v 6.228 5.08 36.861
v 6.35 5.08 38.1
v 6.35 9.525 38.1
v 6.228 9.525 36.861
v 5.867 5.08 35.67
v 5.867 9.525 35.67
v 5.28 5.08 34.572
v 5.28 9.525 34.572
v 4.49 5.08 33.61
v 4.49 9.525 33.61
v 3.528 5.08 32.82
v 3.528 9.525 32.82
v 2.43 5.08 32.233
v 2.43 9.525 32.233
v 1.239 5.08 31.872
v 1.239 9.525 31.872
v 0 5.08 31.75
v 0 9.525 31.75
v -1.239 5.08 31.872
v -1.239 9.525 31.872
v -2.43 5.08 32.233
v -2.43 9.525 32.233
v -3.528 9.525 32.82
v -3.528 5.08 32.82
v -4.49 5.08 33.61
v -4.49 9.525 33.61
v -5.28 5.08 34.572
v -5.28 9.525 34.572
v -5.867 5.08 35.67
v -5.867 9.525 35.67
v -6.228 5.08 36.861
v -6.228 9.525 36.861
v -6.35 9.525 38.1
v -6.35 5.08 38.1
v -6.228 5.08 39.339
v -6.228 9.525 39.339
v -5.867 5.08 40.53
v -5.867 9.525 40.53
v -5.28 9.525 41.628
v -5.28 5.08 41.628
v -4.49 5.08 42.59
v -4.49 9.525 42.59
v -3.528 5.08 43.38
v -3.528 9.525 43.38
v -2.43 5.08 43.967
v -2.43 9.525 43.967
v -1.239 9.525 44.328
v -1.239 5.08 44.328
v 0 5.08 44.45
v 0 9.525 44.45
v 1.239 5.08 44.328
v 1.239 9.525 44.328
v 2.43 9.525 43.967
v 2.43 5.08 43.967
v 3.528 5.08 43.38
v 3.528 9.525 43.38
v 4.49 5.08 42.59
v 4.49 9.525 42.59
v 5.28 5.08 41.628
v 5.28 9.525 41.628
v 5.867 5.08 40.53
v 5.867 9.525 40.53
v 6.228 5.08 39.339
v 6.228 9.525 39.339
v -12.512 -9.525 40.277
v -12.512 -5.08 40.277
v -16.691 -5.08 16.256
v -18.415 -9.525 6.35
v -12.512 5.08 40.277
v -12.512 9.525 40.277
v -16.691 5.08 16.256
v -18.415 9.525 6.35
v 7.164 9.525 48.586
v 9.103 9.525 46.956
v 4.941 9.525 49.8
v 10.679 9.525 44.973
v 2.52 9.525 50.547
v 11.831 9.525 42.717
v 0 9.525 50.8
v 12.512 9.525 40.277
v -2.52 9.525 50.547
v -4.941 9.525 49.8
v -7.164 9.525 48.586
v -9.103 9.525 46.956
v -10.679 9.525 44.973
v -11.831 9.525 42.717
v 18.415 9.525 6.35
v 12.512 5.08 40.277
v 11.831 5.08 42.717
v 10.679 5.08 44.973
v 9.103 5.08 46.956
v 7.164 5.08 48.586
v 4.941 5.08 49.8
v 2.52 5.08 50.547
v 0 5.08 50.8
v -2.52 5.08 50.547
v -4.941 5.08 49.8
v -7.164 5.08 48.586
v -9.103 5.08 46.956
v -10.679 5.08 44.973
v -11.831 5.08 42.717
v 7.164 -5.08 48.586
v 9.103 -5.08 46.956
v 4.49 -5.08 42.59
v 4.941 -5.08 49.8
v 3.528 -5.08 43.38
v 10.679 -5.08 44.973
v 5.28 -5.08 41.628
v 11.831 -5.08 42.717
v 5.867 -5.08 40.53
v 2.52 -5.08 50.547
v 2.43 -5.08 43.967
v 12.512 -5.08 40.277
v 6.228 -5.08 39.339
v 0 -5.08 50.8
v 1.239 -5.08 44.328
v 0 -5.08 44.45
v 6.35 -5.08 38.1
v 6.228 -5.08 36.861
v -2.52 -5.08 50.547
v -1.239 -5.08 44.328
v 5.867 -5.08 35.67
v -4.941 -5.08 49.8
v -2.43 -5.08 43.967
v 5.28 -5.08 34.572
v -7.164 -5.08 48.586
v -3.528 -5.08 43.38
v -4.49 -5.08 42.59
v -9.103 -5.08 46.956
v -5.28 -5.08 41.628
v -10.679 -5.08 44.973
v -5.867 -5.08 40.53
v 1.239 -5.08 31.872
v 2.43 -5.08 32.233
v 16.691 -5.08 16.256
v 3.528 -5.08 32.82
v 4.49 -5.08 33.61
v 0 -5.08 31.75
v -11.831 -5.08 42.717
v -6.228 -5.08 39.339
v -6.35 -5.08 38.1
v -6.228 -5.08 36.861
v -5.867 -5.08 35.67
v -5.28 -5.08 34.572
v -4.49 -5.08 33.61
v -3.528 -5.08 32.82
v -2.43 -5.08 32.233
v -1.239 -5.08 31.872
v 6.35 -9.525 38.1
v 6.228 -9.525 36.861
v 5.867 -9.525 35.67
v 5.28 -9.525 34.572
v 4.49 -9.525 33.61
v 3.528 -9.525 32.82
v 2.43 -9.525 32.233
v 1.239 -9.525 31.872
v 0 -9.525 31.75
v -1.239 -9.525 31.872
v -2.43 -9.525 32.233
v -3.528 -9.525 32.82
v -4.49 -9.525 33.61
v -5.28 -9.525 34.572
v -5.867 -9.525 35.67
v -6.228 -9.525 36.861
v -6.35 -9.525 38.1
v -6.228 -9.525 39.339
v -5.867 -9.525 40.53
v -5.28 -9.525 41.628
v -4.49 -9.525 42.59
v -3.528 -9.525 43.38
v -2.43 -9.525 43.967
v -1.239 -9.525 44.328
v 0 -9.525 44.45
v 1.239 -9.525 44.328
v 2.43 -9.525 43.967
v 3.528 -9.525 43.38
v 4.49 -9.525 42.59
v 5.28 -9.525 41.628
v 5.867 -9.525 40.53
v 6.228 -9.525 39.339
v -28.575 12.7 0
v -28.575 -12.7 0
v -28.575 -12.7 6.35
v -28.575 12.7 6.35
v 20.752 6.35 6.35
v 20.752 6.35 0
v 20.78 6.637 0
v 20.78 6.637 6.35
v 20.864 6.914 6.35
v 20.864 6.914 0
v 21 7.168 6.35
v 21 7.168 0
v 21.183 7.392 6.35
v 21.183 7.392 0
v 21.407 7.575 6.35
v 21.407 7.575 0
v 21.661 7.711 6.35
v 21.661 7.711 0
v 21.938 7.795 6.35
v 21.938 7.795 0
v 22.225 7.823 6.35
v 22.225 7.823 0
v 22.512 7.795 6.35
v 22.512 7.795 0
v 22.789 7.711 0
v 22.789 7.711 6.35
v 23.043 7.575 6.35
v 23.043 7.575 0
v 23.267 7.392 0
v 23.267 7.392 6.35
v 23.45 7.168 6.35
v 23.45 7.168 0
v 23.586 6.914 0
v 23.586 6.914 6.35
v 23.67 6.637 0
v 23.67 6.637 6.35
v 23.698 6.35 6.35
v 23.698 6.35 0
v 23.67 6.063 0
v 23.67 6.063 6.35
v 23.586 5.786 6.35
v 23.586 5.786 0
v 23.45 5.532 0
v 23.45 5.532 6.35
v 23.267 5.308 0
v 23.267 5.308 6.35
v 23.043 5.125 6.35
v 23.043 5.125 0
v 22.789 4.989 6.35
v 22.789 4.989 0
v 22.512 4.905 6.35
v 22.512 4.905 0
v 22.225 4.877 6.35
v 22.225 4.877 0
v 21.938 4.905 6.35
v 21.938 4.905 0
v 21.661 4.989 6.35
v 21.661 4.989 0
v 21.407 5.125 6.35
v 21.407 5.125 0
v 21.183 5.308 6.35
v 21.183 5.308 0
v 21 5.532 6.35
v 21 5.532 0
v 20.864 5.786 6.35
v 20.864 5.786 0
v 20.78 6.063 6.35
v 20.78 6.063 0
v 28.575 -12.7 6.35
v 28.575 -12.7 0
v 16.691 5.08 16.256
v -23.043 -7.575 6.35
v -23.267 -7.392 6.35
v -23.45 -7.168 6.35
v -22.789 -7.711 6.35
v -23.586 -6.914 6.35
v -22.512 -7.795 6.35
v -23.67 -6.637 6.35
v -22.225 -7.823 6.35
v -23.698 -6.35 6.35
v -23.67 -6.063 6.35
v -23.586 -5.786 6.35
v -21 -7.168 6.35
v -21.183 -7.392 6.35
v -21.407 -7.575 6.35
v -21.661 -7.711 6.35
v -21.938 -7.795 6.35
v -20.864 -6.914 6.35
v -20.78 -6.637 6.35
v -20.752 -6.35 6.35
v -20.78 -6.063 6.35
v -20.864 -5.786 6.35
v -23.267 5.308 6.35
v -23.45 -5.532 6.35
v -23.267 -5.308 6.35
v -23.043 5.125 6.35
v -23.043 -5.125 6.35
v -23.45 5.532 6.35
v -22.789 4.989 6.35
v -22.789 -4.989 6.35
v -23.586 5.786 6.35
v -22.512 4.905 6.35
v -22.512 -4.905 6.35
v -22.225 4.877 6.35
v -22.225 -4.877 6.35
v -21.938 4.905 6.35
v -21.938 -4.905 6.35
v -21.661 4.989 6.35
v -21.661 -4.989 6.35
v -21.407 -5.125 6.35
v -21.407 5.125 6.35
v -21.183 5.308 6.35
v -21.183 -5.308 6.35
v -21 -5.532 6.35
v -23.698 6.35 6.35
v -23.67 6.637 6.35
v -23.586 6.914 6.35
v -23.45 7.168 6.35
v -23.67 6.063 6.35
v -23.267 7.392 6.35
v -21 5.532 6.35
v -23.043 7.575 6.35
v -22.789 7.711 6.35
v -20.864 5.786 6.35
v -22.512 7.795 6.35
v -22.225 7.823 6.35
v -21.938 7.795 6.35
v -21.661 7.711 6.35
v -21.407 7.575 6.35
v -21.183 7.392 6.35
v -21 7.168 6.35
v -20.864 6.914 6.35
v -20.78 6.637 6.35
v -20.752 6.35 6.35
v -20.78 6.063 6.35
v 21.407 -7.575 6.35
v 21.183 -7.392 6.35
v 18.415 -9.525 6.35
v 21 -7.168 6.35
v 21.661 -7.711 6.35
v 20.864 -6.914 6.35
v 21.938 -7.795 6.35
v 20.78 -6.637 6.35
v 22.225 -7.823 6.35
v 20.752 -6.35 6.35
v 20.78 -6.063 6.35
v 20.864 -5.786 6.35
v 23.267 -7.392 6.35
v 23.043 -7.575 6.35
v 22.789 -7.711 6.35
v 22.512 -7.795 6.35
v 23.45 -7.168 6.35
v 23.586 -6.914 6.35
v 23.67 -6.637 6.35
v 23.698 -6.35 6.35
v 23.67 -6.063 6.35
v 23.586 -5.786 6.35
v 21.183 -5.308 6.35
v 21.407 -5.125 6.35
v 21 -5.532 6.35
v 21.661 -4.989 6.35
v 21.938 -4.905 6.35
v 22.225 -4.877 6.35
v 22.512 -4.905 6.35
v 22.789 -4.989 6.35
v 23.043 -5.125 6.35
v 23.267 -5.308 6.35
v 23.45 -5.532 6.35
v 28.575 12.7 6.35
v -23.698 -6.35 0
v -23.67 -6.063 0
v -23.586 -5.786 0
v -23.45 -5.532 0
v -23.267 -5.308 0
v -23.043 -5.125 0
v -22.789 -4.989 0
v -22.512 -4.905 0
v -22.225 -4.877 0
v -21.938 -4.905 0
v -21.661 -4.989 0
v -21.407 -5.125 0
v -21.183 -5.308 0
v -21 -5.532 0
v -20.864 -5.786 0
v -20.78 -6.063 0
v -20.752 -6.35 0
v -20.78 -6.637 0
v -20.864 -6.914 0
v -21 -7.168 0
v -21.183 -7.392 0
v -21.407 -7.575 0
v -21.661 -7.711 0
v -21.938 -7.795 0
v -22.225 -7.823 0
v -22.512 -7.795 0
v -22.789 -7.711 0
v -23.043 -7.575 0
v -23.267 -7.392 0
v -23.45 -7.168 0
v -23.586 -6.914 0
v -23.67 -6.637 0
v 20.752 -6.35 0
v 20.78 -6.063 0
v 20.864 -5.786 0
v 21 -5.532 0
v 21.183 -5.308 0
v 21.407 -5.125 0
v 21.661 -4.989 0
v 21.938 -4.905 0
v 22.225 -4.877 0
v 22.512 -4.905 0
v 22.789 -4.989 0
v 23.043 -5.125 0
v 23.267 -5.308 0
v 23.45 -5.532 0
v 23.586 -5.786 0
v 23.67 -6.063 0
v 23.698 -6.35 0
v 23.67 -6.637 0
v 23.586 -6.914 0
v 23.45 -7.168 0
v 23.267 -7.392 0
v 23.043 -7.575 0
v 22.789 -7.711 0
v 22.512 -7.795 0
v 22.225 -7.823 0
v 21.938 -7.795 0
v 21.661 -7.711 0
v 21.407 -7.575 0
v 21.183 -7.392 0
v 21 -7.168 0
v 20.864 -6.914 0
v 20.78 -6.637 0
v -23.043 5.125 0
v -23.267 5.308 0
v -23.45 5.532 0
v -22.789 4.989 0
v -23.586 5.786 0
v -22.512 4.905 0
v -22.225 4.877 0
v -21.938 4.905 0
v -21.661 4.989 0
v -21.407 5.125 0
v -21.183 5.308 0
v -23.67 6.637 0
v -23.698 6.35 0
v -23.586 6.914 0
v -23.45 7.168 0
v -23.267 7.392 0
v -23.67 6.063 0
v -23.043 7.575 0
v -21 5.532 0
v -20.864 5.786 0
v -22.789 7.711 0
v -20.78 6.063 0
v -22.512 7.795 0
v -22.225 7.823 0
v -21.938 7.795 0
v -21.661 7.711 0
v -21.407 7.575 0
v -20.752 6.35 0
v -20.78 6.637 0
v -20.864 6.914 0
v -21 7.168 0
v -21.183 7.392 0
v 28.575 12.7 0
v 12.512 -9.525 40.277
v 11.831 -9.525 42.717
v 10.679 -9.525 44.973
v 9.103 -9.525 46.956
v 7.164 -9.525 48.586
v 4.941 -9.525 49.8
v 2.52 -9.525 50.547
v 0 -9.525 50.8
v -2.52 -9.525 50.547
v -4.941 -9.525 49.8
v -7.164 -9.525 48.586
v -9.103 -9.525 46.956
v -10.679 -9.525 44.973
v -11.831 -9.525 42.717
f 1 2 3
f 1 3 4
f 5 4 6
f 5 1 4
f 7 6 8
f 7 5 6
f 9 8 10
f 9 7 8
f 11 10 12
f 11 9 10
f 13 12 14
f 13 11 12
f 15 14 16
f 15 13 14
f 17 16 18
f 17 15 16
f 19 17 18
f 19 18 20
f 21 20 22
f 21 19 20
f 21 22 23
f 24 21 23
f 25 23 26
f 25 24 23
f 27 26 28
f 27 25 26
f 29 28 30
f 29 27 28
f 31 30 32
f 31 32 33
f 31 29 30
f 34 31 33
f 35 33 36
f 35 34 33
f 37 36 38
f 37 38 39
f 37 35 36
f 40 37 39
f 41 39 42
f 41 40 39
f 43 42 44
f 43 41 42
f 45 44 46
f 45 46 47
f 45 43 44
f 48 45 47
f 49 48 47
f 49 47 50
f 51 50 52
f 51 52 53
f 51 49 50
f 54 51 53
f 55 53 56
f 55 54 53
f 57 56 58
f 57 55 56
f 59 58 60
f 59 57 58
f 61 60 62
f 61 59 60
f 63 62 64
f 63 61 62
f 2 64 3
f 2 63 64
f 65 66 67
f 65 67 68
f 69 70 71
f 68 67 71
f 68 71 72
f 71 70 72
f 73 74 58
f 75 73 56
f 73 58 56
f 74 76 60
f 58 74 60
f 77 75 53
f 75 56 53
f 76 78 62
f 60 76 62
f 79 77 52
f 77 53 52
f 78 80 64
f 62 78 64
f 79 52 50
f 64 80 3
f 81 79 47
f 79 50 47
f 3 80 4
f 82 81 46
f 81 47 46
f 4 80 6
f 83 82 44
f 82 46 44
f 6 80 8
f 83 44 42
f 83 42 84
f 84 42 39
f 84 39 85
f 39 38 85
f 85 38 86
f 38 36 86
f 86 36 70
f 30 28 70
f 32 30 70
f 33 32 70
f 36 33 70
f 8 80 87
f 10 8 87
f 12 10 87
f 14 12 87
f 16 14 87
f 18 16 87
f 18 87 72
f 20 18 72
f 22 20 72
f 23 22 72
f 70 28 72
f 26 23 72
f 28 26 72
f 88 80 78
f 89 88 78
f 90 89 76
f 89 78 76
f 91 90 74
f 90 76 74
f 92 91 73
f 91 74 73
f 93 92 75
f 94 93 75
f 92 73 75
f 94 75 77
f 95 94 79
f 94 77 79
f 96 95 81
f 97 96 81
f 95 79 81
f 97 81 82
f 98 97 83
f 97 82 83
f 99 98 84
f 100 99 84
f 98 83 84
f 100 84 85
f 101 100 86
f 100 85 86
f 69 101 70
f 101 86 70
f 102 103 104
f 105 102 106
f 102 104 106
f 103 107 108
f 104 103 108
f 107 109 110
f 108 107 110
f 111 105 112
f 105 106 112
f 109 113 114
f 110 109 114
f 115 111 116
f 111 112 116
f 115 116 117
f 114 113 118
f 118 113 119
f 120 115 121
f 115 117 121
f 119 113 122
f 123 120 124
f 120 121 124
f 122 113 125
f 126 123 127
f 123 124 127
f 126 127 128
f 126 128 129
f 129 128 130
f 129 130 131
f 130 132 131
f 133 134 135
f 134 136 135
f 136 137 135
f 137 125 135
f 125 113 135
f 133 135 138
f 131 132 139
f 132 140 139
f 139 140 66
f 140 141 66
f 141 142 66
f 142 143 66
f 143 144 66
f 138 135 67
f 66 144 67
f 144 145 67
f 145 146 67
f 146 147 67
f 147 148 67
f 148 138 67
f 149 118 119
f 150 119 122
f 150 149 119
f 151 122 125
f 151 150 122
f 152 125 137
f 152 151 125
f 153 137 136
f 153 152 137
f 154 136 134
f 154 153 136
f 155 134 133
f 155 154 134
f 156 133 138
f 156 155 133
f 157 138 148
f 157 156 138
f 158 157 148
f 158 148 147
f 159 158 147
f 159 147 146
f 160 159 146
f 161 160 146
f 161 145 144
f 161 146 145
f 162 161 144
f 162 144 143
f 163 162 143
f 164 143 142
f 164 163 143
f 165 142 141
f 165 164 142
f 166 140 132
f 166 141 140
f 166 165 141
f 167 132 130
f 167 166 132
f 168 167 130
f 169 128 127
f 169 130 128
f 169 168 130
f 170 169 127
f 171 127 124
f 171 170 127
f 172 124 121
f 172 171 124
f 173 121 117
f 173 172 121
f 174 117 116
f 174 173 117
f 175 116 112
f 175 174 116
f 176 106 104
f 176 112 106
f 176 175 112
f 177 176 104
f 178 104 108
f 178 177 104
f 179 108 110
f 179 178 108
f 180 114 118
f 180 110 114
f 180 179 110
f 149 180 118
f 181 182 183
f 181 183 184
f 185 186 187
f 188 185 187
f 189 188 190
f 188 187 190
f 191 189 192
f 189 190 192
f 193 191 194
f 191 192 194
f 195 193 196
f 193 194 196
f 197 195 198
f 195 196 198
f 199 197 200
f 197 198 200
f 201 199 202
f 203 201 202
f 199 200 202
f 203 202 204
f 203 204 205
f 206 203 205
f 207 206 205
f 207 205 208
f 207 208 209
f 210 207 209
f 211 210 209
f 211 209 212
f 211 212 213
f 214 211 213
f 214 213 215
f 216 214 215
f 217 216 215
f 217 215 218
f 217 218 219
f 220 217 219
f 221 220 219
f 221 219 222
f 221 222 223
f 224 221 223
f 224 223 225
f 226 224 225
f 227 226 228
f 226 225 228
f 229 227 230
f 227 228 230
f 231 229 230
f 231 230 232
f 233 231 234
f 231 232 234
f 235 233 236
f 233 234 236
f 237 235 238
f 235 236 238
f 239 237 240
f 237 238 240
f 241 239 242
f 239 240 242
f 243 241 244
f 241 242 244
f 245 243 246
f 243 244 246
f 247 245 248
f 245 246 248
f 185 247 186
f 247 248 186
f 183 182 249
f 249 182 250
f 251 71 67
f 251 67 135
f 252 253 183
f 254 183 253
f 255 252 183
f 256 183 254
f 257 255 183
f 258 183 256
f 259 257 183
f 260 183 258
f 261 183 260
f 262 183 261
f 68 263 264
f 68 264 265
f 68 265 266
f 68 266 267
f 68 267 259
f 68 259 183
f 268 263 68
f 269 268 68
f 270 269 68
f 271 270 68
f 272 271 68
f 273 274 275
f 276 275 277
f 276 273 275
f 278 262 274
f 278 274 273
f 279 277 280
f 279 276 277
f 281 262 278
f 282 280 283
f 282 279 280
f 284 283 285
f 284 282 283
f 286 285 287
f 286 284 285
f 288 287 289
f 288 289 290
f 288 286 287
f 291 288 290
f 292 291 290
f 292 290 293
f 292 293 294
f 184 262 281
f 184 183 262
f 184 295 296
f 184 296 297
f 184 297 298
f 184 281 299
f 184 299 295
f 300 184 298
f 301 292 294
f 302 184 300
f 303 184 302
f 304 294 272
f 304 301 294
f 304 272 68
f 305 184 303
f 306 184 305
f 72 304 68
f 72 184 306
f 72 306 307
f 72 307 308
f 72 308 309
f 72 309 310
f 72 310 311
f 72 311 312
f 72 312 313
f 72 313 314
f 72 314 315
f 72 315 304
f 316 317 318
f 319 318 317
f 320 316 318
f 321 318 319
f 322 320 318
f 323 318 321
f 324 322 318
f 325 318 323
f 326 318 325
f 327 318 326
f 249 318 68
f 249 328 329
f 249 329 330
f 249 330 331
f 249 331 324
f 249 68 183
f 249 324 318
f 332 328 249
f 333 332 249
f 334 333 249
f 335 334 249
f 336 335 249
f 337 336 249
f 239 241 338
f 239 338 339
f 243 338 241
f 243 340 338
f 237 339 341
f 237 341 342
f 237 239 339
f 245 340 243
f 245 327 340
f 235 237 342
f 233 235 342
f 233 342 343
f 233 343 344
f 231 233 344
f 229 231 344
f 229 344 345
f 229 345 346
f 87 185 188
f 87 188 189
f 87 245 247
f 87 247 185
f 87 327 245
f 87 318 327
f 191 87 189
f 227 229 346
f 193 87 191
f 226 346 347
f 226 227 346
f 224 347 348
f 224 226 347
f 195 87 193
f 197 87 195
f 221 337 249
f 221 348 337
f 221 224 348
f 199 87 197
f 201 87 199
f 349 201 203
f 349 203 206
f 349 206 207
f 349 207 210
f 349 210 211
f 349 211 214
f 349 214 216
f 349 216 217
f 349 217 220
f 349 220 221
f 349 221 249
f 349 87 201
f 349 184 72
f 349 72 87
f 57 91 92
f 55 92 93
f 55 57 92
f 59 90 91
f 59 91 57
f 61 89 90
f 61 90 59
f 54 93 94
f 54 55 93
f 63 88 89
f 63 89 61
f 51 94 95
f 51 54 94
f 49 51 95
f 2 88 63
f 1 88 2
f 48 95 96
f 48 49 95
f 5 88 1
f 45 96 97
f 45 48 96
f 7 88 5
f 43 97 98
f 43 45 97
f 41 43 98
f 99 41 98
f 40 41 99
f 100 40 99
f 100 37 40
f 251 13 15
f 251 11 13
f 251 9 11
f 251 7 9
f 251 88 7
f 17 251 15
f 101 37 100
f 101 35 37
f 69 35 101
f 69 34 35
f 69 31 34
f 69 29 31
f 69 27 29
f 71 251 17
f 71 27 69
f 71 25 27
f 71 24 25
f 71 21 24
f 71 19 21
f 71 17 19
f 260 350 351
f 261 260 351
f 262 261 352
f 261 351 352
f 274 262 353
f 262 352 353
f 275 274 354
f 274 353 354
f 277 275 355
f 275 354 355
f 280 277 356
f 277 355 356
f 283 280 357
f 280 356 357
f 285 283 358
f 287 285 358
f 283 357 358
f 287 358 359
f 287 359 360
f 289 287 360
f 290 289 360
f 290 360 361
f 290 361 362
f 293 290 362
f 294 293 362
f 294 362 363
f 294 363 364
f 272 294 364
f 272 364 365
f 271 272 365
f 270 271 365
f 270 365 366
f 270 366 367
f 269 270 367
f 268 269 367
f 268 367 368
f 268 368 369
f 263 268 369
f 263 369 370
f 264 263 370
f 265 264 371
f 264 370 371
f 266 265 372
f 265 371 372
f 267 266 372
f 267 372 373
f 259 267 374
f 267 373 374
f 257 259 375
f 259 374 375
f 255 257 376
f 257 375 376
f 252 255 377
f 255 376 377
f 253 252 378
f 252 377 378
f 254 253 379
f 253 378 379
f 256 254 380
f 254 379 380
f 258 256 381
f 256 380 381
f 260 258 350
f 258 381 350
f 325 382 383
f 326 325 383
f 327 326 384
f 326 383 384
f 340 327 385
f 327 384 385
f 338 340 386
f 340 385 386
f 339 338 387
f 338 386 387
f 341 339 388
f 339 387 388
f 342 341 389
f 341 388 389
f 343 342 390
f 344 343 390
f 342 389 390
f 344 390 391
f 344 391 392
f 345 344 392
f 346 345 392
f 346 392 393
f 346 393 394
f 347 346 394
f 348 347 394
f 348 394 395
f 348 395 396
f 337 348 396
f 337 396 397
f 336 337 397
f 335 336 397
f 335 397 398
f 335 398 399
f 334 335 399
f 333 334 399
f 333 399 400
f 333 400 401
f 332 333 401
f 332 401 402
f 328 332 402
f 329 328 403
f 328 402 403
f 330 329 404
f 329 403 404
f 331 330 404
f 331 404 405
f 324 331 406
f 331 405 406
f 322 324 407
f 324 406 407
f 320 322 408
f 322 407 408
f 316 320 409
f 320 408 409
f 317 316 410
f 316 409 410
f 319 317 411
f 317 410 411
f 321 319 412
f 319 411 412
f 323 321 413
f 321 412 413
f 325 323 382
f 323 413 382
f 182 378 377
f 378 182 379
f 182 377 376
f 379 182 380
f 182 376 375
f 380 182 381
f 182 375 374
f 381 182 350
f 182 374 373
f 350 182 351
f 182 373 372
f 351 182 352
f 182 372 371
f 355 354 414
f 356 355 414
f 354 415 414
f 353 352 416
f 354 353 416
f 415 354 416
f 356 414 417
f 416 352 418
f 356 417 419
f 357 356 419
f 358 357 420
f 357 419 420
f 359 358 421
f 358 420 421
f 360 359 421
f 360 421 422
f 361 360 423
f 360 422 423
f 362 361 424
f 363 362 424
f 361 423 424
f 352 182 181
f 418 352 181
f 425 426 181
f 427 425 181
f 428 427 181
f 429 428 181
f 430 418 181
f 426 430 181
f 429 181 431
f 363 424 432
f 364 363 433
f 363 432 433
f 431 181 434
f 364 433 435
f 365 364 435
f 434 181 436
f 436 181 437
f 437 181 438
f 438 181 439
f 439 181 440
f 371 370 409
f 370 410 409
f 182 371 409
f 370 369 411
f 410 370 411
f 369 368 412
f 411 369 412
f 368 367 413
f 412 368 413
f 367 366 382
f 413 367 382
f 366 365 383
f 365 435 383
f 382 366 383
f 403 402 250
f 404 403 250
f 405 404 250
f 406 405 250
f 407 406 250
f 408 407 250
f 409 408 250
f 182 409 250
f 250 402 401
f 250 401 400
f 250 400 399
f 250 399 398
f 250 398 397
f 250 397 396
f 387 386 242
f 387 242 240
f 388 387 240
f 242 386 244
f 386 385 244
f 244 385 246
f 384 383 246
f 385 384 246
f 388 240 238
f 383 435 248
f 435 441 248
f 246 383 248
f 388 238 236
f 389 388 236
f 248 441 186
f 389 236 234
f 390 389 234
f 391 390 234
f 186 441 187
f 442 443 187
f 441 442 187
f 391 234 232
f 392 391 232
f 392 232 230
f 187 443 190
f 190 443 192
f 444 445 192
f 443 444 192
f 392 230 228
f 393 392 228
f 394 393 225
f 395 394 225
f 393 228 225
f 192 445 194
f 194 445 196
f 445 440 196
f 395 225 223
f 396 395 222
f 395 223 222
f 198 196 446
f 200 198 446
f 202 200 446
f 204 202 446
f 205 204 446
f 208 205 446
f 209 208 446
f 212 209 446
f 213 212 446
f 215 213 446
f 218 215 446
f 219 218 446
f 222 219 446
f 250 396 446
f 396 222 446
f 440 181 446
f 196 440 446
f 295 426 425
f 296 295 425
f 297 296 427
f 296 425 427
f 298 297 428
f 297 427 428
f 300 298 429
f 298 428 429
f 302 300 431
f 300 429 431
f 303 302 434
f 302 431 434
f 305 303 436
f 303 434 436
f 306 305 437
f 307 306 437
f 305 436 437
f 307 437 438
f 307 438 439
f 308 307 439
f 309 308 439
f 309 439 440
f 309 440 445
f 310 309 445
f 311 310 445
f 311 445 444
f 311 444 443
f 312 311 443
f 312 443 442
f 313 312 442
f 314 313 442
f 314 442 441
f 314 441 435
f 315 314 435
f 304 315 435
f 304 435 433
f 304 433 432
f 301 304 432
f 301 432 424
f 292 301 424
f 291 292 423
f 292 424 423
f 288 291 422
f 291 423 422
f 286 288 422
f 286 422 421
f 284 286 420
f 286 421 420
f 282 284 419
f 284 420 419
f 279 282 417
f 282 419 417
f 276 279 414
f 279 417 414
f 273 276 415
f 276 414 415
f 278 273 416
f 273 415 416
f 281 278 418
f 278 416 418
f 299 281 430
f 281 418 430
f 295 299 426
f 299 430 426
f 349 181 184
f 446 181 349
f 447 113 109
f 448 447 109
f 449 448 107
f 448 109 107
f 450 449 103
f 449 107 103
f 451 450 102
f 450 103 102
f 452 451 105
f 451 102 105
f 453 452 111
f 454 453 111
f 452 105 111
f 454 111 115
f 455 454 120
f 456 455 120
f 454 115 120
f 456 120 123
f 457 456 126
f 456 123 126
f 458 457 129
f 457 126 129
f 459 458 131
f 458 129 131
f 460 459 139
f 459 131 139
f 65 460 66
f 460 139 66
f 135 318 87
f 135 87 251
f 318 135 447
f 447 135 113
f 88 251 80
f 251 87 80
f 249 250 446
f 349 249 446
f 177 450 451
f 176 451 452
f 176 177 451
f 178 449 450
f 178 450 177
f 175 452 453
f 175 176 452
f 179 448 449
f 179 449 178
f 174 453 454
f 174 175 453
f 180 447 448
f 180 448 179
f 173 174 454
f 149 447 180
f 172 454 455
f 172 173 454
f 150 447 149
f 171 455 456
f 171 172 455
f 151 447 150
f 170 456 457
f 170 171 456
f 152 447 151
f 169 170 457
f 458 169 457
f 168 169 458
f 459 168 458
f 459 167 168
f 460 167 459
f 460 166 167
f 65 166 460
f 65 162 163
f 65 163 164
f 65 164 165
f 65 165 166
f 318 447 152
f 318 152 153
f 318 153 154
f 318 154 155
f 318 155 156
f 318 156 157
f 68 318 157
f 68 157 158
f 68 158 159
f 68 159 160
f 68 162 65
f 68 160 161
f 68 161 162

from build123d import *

# Parameters (mm, degrees)
SKETCH1_W                 = 57.15
SKETCH1_H                 = 25.4
BOSS_EXTRUDE1_DEPTH       = 6.35
F_4_CLEARANCE_HOLE1_D     = 2.9464
F_4_CLEARANCE_HOLE1_DEPTH = 6.35
SKETCH4_R                 = 6.35
BOSS_EXTRUDE2_DEPTH       = 9.525
SKETCH5_R                 = 6.35
BOSS_EXTRUDE3_DEPTH       = 9.525
CUT_EXTRUDE1_DEPTH        = 5.08


with BuildPart() as part:
    # Sketch1 → Boss-Extrude1 (new body)
    with BuildSketch(Plane.XY):
        Rectangle(SKETCH1_W, SKETCH1_H)
    extrude(amount=BOSS_EXTRUDE1_DEPTH)

    # #4 Clearance Hole1
    with Locations(Plane.XY.offset(6.35)):
        with Locations((-22.225, 6.35), (22.225, -6.35), (-22.225, -6.35), (22.225, 6.35)):
            Hole(F_4_CLEARANCE_HOLE1_D / 2, depth=F_4_CLEARANCE_HOLE1_DEPTH)

    # Sketch4 → Boss-Extrude2 (add, symmetric)
    with BuildSketch(Plane(origin=(0, 0, 0), x_dir=(1, 0, 0), z_dir=(0, 1, 0))):
        with BuildLine():
            Line((-12.512025451, -40.276974762), (-18.415, -6.35))
            Line((-18.415, -6.35), (18.415, -6.35))
            Line((18.415, -6.35), (12.512025451, -40.276974762))
            ThreePointArc((12.512025451, -40.276974762), (0, -50.8), (-12.512025451, -40.276974762))
        make_face()
        with Locations((0, -38.1)):
            Circle(SKETCH4_R, mode=Mode.SUBTRACT)
    extrude(amount=BOSS_EXTRUDE2_DEPTH, both=True)

    # Sketch5 → Boss-Extrude3 (add, symmetric)
    with BuildSketch(Plane(origin=(0, 0, 0), x_dir=(1, 0, 0), z_dir=(0, 1, 0))):
        with BuildLine():
            Line((17.641611802, -10.795), (-17.641611802, -10.795))
            Line((-17.641611802, -10.795), (-12.512025451, -40.276974762))
            ThreePointArc((-12.512025451, -40.276974762), (0, -50.8), (12.512025451, -40.276974762))
            Line((12.512025451, -40.276974762), (17.641611802, -10.795))
        make_face()
        with Locations((0, -38.1)):
            Circle(SKETCH5_R, mode=Mode.SUBTRACT)
    extrude(amount=BOSS_EXTRUDE3_DEPTH, both=True)

    # Sketch6 → Cut-Extrude1 (cut, symmetric)
    with BuildSketch(Plane(origin=(0, 0, 0), x_dir=(1, 0, 0), z_dir=(0, 1, 0))):
        with BuildLine():
            Line((-16.691449159, -16.256), (16.691449159, -16.256))
            Line((16.691449159, -16.256), (12.512025451, -40.276974762))
            ThreePointArc((12.512025451, -40.276974762), (0, -50.8), (-12.512025451, -40.276974762))
            Line((-12.512025451, -40.276974762), (-16.691449159, -16.256))
        make_face()
    extrude(amount=CUT_EXTRUDE1_DEPTH, both=True, mode=Mode.SUBTRACT)


solid = part.part
